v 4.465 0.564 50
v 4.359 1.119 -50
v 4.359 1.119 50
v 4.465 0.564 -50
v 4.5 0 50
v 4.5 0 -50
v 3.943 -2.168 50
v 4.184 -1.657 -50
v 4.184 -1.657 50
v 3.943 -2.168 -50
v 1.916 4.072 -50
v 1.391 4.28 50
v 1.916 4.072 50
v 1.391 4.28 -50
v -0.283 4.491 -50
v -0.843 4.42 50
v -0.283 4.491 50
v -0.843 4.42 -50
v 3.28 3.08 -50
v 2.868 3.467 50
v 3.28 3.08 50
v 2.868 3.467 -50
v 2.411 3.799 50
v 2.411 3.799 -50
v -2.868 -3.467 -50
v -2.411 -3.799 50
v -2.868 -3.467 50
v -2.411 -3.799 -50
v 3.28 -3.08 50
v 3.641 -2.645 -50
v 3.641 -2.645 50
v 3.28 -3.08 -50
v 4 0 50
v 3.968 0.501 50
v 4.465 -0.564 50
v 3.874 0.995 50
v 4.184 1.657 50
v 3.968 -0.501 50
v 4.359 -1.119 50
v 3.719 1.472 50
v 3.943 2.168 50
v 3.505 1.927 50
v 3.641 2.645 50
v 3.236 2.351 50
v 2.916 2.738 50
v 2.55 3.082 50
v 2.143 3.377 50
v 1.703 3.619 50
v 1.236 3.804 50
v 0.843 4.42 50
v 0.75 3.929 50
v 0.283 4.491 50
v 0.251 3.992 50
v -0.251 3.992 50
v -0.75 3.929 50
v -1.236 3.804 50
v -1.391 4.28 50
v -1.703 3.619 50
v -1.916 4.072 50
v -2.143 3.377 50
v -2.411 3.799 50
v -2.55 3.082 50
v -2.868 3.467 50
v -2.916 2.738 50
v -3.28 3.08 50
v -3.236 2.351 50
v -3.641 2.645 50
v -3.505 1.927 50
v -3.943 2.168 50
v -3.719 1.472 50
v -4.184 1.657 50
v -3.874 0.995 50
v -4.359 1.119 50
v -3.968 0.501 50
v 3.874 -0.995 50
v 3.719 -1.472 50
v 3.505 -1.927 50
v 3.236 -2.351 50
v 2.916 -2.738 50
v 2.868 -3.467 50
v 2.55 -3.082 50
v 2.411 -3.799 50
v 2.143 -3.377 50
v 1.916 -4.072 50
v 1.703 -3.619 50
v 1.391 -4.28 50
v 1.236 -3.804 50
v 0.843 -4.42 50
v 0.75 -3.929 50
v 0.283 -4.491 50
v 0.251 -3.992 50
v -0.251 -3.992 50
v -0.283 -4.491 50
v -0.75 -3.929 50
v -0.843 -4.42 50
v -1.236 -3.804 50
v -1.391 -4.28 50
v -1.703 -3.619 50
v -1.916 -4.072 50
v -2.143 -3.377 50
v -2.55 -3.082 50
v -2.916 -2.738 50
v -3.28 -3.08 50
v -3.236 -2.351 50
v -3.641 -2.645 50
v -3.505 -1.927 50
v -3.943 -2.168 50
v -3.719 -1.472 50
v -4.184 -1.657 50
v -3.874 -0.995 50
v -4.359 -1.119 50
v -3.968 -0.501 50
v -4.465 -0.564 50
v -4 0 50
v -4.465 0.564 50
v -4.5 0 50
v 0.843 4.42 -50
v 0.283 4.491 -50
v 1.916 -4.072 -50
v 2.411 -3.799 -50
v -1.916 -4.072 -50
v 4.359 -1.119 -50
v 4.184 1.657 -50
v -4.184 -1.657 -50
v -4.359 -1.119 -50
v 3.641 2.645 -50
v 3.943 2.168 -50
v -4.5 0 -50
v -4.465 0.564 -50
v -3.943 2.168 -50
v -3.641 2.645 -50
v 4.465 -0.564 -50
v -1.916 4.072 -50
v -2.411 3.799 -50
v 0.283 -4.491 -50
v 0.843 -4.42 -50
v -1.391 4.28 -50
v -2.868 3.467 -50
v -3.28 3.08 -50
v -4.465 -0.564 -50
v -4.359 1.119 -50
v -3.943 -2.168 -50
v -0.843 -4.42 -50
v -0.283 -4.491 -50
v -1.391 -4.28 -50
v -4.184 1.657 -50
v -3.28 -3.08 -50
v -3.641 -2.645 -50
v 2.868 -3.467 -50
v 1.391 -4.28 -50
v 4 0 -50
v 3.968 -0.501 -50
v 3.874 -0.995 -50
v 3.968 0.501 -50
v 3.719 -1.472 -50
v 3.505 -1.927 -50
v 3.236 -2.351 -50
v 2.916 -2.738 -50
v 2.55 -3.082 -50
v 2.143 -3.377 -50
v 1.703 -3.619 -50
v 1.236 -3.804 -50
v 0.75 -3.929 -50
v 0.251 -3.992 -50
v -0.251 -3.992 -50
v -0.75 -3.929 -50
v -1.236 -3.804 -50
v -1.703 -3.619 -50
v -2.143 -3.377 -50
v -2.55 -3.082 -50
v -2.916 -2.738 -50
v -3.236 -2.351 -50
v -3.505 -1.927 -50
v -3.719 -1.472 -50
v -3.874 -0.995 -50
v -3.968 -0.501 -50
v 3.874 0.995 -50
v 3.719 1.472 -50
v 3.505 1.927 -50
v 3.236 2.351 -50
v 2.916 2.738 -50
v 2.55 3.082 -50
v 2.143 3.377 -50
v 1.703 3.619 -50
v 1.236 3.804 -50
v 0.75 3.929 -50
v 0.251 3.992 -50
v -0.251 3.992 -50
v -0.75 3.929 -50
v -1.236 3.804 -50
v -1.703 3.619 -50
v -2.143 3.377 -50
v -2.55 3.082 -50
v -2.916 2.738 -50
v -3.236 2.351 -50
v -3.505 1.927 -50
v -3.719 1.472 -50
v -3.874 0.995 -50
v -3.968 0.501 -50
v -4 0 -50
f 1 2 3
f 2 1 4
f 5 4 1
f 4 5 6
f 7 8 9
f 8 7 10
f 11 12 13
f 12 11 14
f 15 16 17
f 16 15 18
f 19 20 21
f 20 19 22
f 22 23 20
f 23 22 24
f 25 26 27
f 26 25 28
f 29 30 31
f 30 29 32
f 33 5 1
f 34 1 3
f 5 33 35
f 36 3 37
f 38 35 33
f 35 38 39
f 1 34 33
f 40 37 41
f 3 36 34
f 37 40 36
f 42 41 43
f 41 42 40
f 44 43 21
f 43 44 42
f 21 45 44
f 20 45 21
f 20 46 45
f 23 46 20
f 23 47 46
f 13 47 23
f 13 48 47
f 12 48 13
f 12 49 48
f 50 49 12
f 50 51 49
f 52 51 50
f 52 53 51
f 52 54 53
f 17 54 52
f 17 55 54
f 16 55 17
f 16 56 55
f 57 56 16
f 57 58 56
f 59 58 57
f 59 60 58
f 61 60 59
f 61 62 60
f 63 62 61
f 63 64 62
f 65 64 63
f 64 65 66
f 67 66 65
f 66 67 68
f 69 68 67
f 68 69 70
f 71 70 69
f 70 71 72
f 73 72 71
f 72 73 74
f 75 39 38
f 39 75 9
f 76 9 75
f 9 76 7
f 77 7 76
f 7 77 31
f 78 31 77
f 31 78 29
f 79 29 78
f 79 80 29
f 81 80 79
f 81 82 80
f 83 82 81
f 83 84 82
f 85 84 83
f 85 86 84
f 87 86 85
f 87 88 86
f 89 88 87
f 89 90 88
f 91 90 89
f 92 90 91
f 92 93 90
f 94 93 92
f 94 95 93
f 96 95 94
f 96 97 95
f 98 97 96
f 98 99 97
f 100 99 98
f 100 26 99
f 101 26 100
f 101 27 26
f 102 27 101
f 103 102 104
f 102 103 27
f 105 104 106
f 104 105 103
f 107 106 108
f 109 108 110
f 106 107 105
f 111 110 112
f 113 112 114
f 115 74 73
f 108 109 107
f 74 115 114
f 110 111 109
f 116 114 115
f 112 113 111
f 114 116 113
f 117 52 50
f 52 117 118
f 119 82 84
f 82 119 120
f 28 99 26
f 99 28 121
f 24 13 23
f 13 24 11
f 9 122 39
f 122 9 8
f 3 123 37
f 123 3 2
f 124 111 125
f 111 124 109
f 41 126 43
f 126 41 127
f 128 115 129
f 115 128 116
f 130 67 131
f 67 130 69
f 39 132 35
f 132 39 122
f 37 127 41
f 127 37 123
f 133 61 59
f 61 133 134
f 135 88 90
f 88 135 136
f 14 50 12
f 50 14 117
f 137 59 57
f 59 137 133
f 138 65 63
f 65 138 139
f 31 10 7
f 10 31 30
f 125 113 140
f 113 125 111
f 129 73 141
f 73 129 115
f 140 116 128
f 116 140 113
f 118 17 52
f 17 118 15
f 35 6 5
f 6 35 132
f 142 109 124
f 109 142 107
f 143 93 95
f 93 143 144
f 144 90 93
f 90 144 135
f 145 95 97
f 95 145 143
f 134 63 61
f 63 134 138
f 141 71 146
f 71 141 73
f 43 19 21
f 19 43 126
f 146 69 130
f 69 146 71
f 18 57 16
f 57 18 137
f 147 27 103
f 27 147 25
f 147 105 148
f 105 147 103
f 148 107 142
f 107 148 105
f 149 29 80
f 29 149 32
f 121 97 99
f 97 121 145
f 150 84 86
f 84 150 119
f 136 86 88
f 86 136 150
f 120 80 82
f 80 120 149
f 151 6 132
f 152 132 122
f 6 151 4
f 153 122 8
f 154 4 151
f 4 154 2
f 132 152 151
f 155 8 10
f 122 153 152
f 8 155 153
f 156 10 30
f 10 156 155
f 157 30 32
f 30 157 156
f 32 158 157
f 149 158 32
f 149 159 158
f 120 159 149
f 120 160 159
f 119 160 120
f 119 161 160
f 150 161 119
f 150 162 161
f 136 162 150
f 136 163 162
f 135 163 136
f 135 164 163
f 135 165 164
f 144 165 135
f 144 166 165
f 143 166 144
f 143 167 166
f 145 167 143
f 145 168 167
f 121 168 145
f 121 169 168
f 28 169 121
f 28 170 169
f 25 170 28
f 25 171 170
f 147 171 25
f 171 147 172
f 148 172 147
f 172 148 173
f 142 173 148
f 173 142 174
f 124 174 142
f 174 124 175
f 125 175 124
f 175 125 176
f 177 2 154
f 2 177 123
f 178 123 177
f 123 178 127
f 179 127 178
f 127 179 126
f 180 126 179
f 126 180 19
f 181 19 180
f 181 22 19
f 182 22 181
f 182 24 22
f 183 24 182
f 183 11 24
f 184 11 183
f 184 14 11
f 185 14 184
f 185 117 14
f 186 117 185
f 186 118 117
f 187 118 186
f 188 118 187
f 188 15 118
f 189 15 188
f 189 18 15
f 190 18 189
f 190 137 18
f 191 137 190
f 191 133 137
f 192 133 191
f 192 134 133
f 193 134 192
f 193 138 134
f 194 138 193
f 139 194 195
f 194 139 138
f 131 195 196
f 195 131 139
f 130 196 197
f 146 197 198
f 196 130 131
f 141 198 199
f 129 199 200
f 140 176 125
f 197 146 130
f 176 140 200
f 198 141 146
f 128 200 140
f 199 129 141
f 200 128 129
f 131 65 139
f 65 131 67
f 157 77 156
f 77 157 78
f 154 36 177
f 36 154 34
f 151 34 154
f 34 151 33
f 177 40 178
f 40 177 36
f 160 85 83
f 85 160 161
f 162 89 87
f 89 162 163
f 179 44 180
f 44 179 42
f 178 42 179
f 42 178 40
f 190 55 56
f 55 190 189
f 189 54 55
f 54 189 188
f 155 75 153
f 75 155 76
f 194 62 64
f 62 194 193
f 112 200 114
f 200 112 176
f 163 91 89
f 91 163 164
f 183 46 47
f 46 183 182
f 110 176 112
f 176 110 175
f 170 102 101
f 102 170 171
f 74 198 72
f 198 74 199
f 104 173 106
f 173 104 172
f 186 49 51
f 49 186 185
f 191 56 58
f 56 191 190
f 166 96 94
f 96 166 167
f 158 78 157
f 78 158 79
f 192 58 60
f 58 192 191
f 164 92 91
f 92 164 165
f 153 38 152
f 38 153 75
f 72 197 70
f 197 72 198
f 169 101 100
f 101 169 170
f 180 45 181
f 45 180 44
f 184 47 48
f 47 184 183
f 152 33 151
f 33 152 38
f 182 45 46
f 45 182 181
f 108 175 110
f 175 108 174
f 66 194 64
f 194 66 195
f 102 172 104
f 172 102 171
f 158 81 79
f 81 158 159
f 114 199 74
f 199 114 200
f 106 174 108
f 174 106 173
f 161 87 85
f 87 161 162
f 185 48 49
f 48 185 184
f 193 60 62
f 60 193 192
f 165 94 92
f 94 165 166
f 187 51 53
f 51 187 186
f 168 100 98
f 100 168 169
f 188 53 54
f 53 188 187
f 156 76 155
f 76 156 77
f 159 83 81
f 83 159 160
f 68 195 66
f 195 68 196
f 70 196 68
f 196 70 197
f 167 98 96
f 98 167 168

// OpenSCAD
$fn = 50;


difference() {
	union() {
		translate(v = [0, 0, -50.0000000000]) {
			cylinder(h = 100, r = 4.5000000000);
		}
	}
	union() {
		translate(v = [0, 0, -100.0000000000]) {
			cylinder(h = 200, r = 4.0000000000);
		}
	}
}
